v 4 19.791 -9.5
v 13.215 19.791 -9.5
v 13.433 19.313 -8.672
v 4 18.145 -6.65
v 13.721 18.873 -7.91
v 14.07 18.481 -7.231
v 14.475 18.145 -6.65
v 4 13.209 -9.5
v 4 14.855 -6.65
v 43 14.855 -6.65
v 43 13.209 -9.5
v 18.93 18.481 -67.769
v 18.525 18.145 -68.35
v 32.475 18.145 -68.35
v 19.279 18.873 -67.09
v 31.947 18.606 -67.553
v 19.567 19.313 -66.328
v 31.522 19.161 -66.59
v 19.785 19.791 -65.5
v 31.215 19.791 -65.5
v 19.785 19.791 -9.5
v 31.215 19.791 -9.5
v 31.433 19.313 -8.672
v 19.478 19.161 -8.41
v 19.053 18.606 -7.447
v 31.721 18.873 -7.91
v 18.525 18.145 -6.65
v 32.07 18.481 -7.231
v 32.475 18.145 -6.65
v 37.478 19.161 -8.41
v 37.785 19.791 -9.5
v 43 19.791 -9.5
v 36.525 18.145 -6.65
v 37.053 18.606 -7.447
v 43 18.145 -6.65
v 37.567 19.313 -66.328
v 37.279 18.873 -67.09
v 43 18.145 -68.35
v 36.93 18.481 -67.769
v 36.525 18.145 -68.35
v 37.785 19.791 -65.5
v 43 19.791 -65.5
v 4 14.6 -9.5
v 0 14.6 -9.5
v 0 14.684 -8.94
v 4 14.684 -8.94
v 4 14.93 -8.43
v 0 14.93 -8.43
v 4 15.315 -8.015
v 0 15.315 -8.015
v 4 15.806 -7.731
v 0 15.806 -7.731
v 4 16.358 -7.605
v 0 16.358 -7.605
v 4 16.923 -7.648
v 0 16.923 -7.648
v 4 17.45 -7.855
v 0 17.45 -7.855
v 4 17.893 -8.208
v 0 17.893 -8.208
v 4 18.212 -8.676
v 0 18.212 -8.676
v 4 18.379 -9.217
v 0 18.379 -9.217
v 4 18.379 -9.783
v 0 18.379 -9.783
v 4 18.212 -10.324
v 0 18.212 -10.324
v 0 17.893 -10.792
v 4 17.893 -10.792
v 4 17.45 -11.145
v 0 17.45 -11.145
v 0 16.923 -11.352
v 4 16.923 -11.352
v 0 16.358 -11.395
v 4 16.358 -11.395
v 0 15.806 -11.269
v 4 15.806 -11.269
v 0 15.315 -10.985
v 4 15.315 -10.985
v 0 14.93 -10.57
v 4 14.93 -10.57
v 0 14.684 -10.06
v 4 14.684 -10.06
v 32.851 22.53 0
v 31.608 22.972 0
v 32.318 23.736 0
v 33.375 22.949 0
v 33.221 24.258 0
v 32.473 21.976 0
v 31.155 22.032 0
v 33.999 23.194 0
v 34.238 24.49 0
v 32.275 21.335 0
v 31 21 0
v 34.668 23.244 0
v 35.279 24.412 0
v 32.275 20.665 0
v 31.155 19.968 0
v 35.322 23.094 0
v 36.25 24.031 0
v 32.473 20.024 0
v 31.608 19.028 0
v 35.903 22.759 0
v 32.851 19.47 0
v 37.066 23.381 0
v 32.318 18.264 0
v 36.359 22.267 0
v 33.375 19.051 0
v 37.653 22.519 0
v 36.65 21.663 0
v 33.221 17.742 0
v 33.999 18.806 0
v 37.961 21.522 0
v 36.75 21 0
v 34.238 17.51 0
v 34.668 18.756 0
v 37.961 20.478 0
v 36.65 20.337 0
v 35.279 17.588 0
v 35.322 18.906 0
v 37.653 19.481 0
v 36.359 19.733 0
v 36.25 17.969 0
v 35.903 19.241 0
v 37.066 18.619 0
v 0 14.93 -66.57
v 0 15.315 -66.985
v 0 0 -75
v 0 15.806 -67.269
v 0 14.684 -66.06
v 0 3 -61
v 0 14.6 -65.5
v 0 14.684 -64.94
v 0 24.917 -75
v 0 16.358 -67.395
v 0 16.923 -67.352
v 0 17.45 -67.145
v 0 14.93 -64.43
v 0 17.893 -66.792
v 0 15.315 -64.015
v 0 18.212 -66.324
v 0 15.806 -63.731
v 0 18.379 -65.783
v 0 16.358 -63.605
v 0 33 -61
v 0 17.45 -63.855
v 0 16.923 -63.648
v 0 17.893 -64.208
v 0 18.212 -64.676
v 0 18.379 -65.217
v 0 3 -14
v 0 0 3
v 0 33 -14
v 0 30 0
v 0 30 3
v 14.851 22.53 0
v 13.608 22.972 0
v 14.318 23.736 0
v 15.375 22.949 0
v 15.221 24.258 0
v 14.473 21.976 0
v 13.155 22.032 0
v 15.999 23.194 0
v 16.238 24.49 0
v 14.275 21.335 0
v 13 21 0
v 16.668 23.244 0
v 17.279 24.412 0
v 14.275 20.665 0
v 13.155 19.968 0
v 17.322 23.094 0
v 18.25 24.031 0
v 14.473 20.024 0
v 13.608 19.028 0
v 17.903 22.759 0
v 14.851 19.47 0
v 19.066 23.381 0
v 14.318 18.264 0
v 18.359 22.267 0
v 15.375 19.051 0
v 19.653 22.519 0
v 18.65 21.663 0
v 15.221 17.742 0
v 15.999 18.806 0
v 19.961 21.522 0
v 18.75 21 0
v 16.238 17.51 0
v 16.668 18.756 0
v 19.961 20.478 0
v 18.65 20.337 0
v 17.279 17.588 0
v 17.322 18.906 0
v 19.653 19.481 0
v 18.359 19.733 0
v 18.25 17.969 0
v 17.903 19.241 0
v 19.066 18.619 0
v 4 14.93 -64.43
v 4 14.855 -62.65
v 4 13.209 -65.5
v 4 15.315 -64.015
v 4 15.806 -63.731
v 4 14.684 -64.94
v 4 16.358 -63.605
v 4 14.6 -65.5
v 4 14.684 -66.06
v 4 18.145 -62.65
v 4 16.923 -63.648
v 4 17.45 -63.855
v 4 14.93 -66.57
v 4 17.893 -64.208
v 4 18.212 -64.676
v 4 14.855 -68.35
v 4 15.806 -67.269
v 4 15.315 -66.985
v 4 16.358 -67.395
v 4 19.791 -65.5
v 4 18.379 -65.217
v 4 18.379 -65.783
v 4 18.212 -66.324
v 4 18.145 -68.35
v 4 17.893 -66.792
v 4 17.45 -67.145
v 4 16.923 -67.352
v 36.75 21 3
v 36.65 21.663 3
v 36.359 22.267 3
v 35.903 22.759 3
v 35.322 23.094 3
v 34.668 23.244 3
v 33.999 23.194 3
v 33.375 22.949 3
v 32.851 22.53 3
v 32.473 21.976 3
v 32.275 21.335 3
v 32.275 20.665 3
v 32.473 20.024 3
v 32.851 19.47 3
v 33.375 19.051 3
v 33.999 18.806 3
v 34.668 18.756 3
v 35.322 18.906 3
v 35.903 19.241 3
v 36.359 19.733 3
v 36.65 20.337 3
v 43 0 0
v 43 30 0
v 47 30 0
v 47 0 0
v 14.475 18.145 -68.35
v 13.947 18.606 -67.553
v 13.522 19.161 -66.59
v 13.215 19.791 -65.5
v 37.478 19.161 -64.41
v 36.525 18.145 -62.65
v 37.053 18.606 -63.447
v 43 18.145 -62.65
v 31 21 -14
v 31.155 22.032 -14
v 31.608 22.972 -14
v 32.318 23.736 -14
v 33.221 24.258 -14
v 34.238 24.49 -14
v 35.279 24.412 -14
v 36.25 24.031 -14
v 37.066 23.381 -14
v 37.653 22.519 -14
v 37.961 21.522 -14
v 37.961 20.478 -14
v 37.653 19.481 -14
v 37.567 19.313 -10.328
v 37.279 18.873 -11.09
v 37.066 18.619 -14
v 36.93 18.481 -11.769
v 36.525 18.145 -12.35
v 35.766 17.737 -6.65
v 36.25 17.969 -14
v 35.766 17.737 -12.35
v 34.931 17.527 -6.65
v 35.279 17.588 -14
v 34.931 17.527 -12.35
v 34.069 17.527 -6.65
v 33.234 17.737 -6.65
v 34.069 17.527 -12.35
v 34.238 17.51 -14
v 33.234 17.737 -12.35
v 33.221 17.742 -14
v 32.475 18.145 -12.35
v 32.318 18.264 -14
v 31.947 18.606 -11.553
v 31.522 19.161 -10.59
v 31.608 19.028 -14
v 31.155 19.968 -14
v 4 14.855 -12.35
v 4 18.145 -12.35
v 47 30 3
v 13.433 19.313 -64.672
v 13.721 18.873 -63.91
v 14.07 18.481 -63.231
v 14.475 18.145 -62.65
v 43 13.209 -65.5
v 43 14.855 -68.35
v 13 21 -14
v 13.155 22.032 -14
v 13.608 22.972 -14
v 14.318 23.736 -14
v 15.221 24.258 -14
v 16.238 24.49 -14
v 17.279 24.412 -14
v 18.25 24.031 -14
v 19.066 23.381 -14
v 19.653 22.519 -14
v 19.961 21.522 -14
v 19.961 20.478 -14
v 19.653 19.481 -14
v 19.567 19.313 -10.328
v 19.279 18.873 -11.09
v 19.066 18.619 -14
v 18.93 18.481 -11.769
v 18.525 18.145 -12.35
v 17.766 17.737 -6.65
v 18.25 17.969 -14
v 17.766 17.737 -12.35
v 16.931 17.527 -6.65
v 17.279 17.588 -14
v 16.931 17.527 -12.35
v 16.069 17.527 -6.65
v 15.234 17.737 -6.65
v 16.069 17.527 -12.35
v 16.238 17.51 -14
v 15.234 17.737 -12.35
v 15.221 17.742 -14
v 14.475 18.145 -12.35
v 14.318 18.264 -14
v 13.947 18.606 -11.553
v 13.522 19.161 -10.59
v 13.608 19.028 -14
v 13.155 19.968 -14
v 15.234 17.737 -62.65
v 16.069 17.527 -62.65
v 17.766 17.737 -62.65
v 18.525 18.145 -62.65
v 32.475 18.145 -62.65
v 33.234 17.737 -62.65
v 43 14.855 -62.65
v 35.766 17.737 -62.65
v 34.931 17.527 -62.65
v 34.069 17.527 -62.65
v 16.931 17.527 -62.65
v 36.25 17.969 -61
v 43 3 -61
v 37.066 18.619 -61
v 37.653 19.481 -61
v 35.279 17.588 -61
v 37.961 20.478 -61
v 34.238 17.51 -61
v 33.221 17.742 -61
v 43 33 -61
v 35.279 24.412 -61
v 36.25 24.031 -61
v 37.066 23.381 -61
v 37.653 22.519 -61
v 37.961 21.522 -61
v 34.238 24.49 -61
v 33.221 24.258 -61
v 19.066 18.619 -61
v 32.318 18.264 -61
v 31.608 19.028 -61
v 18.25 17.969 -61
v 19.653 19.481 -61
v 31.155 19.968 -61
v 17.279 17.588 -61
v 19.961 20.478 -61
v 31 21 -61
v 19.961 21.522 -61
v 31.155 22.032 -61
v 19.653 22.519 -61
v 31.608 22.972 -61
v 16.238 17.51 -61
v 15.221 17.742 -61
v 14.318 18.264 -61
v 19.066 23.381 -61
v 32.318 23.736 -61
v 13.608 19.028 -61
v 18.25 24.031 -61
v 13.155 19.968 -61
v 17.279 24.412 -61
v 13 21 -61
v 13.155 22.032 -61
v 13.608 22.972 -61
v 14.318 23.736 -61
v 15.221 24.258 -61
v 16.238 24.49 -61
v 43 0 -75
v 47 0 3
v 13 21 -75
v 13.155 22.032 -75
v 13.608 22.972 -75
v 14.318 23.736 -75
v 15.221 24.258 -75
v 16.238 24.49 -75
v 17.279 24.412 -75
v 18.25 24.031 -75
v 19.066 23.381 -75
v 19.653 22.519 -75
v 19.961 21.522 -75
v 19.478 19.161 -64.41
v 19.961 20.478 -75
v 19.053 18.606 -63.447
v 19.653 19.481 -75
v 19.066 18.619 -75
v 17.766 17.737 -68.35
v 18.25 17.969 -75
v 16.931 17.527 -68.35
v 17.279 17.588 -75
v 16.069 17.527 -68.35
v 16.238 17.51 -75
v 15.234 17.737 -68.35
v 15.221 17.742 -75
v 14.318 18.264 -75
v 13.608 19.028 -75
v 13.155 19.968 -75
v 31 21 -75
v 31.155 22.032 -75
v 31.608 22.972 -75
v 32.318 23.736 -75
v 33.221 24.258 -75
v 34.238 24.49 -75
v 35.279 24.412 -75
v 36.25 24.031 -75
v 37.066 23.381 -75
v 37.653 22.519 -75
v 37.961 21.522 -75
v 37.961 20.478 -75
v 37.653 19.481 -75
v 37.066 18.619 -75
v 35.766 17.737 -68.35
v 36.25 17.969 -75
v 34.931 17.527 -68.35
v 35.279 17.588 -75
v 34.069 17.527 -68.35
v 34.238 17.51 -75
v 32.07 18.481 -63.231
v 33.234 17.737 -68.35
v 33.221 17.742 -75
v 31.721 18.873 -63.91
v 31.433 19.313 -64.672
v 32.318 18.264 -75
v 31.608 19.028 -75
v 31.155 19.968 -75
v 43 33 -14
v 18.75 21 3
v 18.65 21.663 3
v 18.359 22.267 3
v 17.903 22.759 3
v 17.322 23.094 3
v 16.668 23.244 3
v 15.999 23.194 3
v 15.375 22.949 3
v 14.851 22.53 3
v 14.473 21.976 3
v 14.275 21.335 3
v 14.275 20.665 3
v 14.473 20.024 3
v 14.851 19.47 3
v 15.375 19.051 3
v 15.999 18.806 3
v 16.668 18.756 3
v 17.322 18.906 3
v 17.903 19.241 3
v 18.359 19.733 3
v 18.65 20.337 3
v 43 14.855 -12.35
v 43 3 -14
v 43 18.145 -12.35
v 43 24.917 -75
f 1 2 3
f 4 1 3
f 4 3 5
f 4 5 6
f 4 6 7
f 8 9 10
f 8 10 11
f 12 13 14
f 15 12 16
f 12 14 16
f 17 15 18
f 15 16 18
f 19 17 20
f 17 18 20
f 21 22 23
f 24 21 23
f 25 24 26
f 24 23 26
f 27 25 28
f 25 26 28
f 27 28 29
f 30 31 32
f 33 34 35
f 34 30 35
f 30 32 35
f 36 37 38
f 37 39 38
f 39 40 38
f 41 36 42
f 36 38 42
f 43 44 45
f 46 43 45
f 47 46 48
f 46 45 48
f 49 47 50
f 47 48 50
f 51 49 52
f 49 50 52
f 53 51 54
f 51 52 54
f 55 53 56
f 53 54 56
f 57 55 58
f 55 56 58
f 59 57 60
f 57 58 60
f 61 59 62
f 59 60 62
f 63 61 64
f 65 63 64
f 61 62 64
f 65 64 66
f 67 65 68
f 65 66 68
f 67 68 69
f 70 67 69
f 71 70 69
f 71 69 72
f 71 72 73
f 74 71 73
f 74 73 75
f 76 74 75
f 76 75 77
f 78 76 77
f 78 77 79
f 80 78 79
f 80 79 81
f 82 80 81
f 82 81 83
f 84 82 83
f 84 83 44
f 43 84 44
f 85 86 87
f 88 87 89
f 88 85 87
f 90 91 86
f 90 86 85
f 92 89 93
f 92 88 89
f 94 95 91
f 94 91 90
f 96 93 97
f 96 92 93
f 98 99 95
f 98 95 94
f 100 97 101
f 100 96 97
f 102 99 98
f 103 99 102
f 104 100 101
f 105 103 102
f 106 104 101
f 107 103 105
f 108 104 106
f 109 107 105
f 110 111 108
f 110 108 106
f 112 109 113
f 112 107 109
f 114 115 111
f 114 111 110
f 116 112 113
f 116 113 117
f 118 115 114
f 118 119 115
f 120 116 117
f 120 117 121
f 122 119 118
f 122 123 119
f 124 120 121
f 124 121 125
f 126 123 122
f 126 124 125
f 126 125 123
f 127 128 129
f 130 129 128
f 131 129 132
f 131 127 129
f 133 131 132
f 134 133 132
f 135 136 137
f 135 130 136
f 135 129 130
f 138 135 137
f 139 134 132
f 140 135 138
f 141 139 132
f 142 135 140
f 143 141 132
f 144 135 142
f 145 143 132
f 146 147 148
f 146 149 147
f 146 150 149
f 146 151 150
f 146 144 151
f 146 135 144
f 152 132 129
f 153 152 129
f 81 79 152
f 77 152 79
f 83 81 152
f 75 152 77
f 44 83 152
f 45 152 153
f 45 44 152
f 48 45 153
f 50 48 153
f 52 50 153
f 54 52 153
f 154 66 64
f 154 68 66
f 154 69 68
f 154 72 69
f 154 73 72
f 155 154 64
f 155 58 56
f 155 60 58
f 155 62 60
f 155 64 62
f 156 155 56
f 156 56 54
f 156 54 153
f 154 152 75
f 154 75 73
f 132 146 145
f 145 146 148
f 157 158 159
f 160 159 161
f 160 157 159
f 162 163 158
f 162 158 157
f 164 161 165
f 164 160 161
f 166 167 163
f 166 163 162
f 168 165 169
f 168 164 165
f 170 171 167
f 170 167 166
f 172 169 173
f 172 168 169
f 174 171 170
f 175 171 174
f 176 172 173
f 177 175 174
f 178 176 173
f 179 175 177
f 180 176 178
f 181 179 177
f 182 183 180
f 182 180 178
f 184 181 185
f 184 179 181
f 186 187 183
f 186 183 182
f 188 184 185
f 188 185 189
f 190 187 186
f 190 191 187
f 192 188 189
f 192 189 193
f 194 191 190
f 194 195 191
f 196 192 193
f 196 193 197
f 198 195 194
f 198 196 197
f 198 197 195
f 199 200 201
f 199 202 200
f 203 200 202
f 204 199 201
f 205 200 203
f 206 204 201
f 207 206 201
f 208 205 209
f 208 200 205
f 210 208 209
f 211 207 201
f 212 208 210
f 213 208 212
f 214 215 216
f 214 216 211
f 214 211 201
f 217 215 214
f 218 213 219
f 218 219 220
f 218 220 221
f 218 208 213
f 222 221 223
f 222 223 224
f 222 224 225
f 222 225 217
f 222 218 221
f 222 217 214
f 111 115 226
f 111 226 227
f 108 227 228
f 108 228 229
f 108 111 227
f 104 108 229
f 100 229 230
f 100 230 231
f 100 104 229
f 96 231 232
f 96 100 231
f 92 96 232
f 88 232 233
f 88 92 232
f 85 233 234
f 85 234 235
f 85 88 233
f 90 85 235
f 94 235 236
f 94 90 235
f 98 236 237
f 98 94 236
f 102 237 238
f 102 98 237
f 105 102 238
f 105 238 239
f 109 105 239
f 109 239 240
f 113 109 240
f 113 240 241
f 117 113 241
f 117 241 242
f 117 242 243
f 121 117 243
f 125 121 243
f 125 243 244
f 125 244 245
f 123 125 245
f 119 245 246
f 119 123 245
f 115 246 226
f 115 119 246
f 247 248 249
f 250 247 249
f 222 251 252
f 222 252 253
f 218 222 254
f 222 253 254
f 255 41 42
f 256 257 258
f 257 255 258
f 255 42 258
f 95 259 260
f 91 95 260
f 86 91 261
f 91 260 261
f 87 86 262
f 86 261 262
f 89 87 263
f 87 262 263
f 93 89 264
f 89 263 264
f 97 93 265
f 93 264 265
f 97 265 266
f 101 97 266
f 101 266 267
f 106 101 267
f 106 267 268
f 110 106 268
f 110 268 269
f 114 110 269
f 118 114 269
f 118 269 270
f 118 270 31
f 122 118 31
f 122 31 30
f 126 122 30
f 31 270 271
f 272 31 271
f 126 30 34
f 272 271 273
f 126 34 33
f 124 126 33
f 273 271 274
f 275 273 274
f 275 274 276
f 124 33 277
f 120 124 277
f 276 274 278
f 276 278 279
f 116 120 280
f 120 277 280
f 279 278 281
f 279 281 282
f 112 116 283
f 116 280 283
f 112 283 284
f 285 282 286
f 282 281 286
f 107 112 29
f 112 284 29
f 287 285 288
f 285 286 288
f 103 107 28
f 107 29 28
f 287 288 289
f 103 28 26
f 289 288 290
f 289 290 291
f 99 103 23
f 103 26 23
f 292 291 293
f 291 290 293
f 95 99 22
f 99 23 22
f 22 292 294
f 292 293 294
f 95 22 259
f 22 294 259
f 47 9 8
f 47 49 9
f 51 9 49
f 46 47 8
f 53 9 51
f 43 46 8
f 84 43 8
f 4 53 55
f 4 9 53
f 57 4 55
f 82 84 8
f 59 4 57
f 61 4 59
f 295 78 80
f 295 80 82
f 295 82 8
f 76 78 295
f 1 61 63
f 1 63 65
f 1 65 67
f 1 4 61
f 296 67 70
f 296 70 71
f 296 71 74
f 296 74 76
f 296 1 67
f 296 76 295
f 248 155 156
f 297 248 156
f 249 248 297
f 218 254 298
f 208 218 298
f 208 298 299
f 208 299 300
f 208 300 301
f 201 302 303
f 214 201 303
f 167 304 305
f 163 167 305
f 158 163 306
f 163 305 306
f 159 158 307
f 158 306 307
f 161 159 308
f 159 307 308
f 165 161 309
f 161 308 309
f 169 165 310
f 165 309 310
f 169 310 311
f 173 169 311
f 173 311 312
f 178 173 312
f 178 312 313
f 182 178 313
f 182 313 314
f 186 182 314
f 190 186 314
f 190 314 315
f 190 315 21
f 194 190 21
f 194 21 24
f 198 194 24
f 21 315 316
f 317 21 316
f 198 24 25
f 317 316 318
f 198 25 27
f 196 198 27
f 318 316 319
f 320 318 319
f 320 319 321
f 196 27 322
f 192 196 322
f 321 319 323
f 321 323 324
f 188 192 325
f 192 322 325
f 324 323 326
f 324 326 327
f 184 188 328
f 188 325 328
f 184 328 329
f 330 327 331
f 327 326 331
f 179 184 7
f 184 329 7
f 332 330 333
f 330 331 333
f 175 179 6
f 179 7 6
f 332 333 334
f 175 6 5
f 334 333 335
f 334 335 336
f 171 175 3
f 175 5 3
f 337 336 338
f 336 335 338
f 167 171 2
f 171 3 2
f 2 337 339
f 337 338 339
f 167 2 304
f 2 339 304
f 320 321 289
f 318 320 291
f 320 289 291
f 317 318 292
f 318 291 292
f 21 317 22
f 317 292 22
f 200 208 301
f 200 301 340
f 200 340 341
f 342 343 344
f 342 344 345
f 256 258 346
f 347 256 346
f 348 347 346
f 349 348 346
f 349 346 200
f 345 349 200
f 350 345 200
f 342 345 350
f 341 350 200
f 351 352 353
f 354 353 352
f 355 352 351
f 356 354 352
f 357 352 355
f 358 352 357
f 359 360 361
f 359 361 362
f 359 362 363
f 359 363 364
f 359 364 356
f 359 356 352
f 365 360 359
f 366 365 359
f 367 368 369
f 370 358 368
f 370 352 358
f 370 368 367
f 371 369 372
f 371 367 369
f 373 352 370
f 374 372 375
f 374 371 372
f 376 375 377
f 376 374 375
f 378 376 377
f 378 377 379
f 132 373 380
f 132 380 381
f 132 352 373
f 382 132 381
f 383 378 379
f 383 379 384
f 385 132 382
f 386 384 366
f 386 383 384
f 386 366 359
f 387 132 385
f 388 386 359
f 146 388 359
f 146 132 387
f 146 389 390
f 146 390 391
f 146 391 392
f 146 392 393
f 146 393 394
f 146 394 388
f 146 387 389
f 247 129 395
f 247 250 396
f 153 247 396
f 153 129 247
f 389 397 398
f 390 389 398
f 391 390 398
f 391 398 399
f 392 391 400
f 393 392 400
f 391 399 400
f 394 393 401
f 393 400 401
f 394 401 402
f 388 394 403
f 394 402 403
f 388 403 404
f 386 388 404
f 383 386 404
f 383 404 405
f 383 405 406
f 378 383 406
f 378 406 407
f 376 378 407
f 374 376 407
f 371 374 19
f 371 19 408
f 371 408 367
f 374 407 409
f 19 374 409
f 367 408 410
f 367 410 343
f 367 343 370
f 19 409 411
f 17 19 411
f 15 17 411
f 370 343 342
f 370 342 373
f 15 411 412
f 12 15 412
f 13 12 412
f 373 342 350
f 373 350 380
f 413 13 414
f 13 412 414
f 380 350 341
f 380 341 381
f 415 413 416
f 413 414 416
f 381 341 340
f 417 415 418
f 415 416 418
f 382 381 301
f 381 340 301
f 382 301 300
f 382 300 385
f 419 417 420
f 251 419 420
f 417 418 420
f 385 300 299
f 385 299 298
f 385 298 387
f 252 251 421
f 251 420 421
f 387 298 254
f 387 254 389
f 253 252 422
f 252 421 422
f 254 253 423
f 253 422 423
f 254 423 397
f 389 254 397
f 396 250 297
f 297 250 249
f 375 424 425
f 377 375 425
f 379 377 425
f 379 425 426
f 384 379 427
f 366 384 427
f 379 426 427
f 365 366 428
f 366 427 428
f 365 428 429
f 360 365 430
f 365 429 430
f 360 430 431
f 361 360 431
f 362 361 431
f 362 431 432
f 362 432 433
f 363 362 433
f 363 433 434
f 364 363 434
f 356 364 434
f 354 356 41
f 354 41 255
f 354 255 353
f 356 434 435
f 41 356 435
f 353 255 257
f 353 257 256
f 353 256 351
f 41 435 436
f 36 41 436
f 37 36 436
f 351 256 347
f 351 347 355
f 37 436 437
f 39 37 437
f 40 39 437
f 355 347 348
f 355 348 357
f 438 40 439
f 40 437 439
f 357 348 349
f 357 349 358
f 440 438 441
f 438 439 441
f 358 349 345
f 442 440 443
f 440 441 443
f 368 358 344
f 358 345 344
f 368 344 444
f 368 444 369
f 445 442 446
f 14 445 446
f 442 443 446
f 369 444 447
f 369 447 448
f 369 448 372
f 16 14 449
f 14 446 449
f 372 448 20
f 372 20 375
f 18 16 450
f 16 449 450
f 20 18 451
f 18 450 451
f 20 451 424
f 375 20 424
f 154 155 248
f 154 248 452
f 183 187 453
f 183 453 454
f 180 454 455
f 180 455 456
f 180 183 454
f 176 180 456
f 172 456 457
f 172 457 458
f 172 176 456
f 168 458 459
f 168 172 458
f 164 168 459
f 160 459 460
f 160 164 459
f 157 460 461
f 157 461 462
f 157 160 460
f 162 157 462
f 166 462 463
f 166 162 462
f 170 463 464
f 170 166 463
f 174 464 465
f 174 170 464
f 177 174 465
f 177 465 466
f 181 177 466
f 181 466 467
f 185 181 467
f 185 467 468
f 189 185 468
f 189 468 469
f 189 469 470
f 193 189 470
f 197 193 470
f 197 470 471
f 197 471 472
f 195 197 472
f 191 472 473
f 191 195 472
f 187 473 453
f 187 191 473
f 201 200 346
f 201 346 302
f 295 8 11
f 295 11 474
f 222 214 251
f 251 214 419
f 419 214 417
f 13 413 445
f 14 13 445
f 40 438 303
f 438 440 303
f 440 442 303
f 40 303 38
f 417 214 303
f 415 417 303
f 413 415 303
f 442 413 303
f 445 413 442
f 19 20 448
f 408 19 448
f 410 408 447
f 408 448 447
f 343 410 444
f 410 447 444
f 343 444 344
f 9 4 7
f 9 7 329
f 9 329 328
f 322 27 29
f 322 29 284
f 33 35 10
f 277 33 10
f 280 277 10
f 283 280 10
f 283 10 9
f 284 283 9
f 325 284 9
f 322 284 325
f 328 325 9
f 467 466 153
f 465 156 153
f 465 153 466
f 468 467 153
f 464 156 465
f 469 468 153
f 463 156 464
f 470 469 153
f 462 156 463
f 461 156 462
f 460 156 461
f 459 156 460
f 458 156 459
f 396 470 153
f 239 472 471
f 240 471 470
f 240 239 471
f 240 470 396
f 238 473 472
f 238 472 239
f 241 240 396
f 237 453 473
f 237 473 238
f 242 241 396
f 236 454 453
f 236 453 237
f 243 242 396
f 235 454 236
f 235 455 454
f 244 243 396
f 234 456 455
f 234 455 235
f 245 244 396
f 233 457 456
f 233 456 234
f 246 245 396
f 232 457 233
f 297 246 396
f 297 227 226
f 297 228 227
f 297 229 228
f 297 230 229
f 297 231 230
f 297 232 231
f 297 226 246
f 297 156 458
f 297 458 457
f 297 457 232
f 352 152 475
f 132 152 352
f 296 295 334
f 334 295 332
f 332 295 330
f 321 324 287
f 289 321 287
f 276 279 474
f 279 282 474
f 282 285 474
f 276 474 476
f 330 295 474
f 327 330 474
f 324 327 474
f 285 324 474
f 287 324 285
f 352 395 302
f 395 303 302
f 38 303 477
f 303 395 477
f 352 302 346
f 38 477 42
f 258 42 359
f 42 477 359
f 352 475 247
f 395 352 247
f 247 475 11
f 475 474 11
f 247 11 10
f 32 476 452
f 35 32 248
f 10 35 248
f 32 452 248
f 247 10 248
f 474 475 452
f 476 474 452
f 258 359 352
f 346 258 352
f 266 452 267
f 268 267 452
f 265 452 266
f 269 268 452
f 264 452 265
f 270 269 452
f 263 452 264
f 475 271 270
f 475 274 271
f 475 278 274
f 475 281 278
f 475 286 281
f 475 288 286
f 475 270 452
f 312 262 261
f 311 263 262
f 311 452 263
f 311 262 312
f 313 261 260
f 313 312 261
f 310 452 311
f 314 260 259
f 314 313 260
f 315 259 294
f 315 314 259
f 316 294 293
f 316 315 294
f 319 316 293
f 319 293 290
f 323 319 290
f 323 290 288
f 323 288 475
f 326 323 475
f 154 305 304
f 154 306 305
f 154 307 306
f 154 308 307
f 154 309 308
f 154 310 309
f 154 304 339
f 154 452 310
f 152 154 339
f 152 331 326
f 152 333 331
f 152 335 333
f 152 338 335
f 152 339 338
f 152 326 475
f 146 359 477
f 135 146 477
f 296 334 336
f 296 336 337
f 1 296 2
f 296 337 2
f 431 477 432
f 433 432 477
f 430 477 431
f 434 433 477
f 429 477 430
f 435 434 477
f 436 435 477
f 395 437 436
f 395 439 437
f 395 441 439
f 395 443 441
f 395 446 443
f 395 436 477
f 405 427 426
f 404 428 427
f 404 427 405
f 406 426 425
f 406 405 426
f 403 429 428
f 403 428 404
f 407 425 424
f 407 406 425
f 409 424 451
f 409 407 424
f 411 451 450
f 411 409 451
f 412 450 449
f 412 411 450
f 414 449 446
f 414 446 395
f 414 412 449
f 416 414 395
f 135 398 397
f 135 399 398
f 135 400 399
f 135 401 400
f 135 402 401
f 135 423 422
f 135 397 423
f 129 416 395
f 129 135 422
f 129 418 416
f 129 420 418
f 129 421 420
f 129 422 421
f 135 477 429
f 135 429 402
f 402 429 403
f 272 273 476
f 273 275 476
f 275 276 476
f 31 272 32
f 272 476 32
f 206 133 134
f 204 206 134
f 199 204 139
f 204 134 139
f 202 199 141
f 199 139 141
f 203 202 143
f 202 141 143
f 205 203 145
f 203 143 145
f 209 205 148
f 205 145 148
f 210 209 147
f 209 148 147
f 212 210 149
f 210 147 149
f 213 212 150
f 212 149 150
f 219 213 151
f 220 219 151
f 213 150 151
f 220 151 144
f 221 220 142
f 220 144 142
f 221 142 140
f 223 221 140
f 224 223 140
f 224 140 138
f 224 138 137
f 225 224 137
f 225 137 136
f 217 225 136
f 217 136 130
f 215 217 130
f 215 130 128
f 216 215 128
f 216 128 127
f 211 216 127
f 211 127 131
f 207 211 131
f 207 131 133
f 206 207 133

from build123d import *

# Parameters (mm, degrees)
SKETCH1_W           = 47
SKETCH1_H           = 30
SKETCH1_R           = 2.25
BOSS_EXTRUDE1_DEPTH = 3
SKETCH2_R           = 1.9
BOSS_EXTRUDE2_DEPTH = 43
CUT_EXTRUDE1_REACH  = 98.861
SKETCH3_R           = 3.5
CUT_EXTRUDE2_DEPTH  = 39


with BuildPart() as part:
    # Sketch1 → Boss-Extrude1 (new body)
    with BuildSketch(Plane.XY):
        with Locations((23.5, 15)):
            Rectangle(SKETCH1_W, SKETCH1_H)
        with Locations((16.5, 21)):
            Circle(SKETCH1_R, mode=Mode.SUBTRACT)
        with Locations((34.5, 21)):
            Circle(SKETCH1_R, mode=Mode.SUBTRACT)
    extrude(amount=BOSS_EXTRUDE1_DEPTH)

    # Sketch2 → Boss-Extrude2 (add)
    # profile 1 of 3: a face of its own
    with BuildSketch(Plane.ZY):
        Polygon((-75, 24.917096231), (-75, 3), (-61, 3), (-61, 33), align=None)
        with Locations(Location((-65.5, 16.5, 0), (0, 0, 270))):
            Circle(SKETCH2_R, mode=Mode.SUBTRACT)
    # profile 2 of 3: a face of its own
    with BuildSketch(Plane.ZY):
        Polygon((-75, 0), (0, 0), (0, 3), (-14, 3), (-61, 3), (-75, 3), align=None)
    # profile 3 of 3: a face of its own
    with BuildSketch(Plane.ZY):
        Polygon((-14, 3), (0, 3), (0, 30), (-14, 33), align=None)
        with Locations(Location((-9.5, 16.5, 0), (0, 0, 270))):
            Circle(SKETCH2_R, mode=Mode.SUBTRACT)
    extrude(amount=-BOSS_EXTRUDE2_DEPTH)

    # Cut-Extrude1: up to this face of the body (flat: up to its plane)
    cut_extrude1_end = Plane(part.part.faces().sort_by_distance((45, 15, 0))[0])
    # Sketch3 → Cut-Extrude1 (cut, up to the picked face)
    with BuildSketch(Plane(origin=(0, 0, -75), x_dir=(-1, 0, 0), z_dir=(0, 0, -1)), mode=Mode.PRIVATE) as cut_extrude1_sk1:
        with Locations((-34.5, 21)):
            Circle(SKETCH3_R)
    cut_extrude1_tool1 = split(extrude(cut_extrude1_sk1.sketch, amount=-CUT_EXTRUDE1_REACH, mode=Mode.PRIVATE), bisect_by=cut_extrude1_end, keep=Keep.BOTH, mode=Mode.PRIVATE)
    # Sketch3 → Cut-Extrude1 (cut, up to the picked face)
    with BuildSketch(Plane(origin=(0, 0, -75), x_dir=(-1, 0, 0), z_dir=(0, 0, -1)), mode=Mode.PRIVATE) as cut_extrude1_sk2:
        with Locations((-16.5, 21)):
            Circle(SKETCH3_R)
    cut_extrude1_tool2 = split(extrude(cut_extrude1_sk2.sketch, amount=-CUT_EXTRUDE1_REACH, mode=Mode.PRIVATE), bisect_by=cut_extrude1_end, keep=Keep.BOTH, mode=Mode.PRIVATE)
    add(cut_extrude1_tool1.solids().sort_by(Axis((34.5, 21, -75), (0, 0, 1)))[0], mode=Mode.SUBTRACT)
    add(cut_extrude1_tool2.solids().sort_by(Axis((16.5, 21, -75), (0, 0, 1)))[0], mode=Mode.SUBTRACT)

    # Sketch4 → Cut-Extrude2 (cut)
    with BuildSketch(Plane(origin=(43, 0, 0), x_dir=(0, 0, -1), z_dir=(1, 0, 0))):
        Polygon((9.5, 13.209103466), (12.35, 14.854551733), (12.35, 18.145448267), (9.5, 19.790896534), (6.65, 18.145448267), (6.65, 14.854551733), align=None)
        Polygon((65.5, 13.209103466), (68.35, 14.854551733), (68.35, 18.145448267), (65.5, 19.790896534), (62.65, 18.145448267), (62.65, 14.854551733), align=None)
    extrude(amount=-CUT_EXTRUDE2_DEPTH, mode=Mode.SUBTRACT)


solid = part.part
